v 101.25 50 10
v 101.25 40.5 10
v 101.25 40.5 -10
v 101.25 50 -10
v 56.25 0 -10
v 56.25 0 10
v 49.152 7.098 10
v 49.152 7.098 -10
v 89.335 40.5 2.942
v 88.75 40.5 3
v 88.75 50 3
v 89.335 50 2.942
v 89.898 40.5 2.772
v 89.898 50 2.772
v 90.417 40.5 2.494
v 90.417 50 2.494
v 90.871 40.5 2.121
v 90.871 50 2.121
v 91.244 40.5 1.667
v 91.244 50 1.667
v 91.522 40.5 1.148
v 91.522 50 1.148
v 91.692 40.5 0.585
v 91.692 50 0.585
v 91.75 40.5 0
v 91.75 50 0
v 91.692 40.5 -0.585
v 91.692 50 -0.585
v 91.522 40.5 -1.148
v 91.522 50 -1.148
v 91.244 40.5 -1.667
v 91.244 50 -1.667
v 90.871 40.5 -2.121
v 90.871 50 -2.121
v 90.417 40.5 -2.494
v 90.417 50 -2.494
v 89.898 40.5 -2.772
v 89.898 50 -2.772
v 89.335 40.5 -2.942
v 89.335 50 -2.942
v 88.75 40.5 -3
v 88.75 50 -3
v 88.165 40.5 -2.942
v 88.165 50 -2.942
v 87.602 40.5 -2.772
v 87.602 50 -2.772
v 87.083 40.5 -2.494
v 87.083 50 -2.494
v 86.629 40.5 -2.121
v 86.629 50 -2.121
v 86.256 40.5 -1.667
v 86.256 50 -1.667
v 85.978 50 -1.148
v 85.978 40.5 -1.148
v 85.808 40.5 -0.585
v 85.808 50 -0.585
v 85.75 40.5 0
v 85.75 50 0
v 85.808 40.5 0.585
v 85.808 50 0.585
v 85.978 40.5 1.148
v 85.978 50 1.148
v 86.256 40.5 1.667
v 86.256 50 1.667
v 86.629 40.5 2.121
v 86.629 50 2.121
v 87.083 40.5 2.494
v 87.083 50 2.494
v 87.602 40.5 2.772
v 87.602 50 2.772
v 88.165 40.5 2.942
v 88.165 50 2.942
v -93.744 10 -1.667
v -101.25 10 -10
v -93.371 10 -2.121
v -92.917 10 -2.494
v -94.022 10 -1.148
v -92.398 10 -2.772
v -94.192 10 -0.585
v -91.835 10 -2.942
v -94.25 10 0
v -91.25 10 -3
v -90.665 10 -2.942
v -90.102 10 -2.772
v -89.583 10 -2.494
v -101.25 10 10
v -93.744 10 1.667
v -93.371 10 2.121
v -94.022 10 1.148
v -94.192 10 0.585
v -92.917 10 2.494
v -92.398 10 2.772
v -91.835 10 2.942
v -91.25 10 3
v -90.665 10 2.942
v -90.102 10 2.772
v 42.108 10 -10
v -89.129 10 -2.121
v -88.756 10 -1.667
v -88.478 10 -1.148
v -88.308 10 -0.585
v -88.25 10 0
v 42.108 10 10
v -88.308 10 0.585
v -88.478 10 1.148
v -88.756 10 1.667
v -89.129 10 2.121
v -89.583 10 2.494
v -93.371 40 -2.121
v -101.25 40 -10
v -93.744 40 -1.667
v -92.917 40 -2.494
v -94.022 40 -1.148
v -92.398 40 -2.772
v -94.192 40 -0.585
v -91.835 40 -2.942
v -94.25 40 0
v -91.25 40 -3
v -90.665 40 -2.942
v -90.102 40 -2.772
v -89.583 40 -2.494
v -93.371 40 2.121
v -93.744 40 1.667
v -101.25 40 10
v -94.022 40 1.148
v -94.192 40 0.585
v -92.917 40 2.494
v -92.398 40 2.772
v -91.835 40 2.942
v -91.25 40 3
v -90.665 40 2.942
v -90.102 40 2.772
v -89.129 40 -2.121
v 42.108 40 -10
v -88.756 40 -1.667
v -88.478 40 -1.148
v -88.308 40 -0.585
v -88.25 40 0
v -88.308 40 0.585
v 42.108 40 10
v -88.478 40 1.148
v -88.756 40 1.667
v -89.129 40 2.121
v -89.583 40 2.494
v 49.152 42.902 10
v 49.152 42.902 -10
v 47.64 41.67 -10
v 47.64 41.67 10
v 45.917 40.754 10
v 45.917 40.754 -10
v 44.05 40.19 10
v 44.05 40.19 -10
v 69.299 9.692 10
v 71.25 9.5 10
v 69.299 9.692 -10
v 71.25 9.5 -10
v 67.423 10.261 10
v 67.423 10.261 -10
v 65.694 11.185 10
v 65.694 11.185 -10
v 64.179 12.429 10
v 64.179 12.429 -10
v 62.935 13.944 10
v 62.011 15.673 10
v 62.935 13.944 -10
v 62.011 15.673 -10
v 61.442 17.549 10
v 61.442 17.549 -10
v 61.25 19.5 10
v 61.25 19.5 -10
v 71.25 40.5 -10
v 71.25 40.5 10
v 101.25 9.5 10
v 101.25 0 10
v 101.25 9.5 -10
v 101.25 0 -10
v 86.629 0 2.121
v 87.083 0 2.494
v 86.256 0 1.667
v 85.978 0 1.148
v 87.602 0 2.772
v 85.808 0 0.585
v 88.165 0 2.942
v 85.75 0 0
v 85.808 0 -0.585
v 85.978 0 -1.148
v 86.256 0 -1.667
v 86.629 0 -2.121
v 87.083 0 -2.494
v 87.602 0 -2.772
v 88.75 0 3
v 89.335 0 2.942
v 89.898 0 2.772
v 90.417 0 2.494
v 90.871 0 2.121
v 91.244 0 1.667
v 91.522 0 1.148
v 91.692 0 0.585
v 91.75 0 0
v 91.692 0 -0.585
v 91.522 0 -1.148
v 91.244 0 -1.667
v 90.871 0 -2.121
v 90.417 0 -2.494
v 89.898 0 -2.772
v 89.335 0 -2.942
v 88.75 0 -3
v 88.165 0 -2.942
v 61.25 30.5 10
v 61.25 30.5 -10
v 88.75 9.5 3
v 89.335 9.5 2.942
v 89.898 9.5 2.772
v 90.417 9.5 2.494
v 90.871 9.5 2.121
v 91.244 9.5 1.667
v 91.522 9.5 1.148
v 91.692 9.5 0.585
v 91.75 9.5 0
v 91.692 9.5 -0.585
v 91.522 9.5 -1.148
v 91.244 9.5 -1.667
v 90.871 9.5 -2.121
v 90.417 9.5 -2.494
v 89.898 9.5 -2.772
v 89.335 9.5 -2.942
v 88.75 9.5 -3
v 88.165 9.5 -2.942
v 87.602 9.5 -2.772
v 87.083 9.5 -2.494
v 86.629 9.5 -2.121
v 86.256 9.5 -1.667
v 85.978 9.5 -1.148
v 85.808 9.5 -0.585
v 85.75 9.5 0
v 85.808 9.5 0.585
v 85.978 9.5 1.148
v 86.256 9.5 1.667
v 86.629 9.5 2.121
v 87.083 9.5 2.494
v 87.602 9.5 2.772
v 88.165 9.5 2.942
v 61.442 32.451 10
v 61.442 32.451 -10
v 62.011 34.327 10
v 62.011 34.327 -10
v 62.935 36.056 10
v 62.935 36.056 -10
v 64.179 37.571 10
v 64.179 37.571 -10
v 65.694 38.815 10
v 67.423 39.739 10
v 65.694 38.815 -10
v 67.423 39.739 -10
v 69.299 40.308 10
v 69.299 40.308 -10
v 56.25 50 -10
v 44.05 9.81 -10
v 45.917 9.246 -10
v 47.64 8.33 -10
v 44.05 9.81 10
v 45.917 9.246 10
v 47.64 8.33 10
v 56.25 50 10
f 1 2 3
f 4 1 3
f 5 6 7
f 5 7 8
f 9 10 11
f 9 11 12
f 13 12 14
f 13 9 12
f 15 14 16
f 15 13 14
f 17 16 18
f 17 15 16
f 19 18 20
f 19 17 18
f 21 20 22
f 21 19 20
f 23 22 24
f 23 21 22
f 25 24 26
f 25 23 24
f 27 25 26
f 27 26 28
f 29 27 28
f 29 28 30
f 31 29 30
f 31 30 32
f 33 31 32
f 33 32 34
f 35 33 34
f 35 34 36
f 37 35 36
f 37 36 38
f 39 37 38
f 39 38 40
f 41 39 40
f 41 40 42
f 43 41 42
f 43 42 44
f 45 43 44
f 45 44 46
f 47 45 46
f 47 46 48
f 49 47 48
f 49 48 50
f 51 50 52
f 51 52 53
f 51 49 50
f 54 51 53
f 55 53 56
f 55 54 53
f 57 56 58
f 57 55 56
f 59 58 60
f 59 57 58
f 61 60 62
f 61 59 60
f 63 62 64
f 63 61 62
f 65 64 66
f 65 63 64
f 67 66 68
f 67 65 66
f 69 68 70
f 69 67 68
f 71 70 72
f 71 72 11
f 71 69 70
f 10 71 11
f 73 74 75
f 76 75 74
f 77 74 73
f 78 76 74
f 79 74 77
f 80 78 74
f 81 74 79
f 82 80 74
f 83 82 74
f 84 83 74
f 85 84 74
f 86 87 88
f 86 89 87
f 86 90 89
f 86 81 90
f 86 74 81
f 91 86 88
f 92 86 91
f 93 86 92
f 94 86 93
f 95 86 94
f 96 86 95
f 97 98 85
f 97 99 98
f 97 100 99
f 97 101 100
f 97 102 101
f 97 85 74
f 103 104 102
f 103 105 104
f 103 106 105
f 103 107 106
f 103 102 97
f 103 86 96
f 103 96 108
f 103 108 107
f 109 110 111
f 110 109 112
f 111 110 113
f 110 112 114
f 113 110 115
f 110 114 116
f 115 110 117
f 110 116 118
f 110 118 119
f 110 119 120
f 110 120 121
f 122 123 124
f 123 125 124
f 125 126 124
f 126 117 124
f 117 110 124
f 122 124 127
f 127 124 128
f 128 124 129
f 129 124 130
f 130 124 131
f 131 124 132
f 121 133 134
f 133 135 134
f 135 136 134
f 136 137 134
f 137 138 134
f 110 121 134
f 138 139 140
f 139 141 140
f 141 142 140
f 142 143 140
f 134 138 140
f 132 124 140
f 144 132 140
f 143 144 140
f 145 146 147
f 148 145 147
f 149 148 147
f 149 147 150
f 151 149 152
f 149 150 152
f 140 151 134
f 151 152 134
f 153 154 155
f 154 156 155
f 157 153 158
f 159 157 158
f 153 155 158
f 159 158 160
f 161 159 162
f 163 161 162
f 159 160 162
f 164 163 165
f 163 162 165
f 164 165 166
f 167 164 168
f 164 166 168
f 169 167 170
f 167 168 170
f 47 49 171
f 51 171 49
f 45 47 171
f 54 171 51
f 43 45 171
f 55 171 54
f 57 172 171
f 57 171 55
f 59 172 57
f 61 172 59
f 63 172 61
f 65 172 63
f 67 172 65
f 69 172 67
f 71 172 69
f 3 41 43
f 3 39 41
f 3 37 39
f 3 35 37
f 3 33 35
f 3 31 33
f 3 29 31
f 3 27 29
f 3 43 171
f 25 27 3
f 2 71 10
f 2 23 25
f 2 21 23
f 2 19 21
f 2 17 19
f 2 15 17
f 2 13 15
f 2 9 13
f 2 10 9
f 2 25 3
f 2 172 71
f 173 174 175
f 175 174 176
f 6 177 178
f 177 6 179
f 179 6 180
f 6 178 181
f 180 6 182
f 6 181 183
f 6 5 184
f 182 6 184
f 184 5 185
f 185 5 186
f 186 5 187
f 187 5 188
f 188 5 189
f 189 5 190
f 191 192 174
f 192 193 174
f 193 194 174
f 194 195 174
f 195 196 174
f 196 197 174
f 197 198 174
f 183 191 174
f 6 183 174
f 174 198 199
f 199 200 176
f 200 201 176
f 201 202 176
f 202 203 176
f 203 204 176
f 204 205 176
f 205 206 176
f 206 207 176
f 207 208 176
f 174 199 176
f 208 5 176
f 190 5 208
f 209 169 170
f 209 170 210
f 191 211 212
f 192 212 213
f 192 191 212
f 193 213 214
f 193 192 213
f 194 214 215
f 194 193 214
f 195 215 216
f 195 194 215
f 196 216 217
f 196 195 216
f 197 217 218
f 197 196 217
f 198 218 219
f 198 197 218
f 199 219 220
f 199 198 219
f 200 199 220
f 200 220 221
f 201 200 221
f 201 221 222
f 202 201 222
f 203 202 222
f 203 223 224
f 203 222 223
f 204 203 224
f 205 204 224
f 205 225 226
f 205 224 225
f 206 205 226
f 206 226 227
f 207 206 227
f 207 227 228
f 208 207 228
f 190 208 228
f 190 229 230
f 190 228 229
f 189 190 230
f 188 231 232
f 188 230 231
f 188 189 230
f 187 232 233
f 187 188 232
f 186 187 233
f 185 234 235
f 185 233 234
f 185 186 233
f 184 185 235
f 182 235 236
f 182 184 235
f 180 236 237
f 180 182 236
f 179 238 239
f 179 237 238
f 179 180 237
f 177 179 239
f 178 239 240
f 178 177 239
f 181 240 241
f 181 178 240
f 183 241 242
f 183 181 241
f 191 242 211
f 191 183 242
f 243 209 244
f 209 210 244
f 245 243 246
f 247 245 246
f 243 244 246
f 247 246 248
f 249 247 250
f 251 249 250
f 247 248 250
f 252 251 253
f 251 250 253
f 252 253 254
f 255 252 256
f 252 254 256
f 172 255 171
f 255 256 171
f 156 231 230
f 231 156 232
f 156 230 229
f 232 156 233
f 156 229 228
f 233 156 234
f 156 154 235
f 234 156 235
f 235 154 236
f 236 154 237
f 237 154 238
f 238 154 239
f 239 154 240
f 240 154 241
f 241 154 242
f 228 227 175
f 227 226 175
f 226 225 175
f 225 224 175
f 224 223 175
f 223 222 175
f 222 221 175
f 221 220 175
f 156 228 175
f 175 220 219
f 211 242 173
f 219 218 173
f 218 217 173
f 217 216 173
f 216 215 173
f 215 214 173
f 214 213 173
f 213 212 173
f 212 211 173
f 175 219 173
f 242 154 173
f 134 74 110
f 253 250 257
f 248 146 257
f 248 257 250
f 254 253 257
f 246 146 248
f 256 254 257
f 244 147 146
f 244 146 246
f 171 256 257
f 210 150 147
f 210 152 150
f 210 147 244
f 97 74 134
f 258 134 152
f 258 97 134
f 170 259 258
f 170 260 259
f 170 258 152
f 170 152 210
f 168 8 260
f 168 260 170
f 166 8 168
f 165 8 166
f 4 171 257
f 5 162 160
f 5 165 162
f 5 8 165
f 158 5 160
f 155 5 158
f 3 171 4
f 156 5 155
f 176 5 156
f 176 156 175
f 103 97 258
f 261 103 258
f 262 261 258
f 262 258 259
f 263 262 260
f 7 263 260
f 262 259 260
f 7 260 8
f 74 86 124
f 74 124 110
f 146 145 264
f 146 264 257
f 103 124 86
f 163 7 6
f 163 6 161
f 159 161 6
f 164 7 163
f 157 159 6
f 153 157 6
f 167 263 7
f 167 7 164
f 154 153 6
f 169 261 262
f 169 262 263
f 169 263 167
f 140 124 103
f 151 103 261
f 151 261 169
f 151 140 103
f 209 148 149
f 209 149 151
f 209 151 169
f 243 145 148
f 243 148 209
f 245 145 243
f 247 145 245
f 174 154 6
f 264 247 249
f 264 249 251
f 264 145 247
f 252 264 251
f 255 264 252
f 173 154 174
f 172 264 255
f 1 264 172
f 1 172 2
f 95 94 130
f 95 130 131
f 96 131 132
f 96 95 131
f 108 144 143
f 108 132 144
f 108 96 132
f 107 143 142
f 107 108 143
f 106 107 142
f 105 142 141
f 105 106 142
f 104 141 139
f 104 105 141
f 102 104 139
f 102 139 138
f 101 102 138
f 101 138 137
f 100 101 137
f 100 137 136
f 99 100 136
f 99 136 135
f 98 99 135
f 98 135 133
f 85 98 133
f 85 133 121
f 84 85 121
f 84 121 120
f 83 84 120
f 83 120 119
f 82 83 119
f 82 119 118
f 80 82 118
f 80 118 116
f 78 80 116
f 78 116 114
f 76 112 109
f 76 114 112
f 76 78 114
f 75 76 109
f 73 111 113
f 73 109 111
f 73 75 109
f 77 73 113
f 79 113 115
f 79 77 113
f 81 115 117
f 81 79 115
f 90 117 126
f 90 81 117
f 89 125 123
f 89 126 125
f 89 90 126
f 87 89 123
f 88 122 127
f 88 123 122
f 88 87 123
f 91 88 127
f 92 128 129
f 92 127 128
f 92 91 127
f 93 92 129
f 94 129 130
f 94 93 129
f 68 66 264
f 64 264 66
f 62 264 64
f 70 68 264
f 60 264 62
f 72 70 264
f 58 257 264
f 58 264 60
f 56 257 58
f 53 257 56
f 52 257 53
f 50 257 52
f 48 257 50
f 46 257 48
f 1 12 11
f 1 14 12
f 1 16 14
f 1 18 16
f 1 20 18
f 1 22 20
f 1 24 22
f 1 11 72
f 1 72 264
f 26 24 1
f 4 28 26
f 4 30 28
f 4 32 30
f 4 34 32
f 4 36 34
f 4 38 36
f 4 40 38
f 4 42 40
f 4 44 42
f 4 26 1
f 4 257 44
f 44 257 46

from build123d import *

# Parameters (mm, degrees)
SKETCH1_W           = 202.5
SKETCH1_H           = 20
SKETCH1_R           = 3
BOSS_EXTRUDE1_DEPTH = 50
SKETCH2_W           = 80
SKETCH2_H           = 31
SKETCH2_W_2         = 147.5
SKETCH2_H_2         = 10
CUT_EXTRUDE1_DEPTH  = 25
CHAMFER1_SIZE       = 10
FILLET1_R           = 10
FILLET2_START       = -10
FILLET2_DEPTH       = 20


with BuildPart() as part:
    # Sketch1 → Boss-Extrude1 (new body)
    with BuildSketch(Plane(origin=(0, 0, 0), x_dir=(1, 0, 0), z_dir=(0, 1, 0))):
        Rectangle(SKETCH1_W, SKETCH1_H)
        with Locations(Location((-91.25, 0, 0), (0, 0, 270))):
            Circle(SKETCH1_R, mode=Mode.SUBTRACT)
        with Locations(Location((88.75, 0, 0), (0, 0, 270))):
            Circle(SKETCH1_R, mode=Mode.SUBTRACT)
    extrude(amount=BOSS_EXTRUDE1_DEPTH)

    # Sketch2 → Cut-Extrude1 (cut)
    with BuildSketch(Plane.XY.offset(10)):
        with Locations((101.25, 25)):
            Rectangle(SKETCH2_W, SKETCH2_H)
        with Locations((-27.5, 45)):
            Rectangle(SKETCH2_W_2, SKETCH2_H_2)
        with Locations((-27.5, 5)):
            Rectangle(SKETCH2_W_2, SKETCH2_H_2)
    extrude(amount=-CUT_EXTRUDE1_DEPTH, mode=Mode.SUBTRACT)

    # Chamfer1
    chamfer1_edges = [part.edges().sort_by_distance(p)[0] for p in [
        (46.25, 0, 0),
        (46.25, 50, 0),
    ]]
    chamfer(chamfer1_edges, length=CHAMFER1_SIZE - 0.0001)  # a hair under: the kernel refuses the full size

    # Fillet1
    fillet1_edges = [part.edges().sort_by_distance(p)[0] for p in [
        (61.25, 9.5, 0),
        (61.25, 40.5, 0),
    ]]
    fillet(fillet1_edges, radius=FILLET1_R)

    # Fillet2: read off the stored shape, not the designer's step
    # Fillet2 outline → Fillet2 (add)
    with BuildSketch(Plane.XY.offset(FILLET2_START)):
        with BuildLine():
            ThreePointArc((49.178932188, 42.928932188), (45.9346987, 40.761204675), (42.107864376, 40))
            Line((42.107864376, 40), (46.25, 40))
            Line((46.25, 40), (49.178932188, 42.928932188))
        make_face()
        with BuildLine():
            Line((46.25, 10), (42.107864376, 10))
            ThreePointArc((42.107864376, 10), (45.9346987, 9.238795325), (49.178932188, 7.071067812))
            Line((49.178932188, 7.071067812), (46.25, 10))
        make_face()
    extrude(amount=FILLET2_DEPTH)


solid = part.part
